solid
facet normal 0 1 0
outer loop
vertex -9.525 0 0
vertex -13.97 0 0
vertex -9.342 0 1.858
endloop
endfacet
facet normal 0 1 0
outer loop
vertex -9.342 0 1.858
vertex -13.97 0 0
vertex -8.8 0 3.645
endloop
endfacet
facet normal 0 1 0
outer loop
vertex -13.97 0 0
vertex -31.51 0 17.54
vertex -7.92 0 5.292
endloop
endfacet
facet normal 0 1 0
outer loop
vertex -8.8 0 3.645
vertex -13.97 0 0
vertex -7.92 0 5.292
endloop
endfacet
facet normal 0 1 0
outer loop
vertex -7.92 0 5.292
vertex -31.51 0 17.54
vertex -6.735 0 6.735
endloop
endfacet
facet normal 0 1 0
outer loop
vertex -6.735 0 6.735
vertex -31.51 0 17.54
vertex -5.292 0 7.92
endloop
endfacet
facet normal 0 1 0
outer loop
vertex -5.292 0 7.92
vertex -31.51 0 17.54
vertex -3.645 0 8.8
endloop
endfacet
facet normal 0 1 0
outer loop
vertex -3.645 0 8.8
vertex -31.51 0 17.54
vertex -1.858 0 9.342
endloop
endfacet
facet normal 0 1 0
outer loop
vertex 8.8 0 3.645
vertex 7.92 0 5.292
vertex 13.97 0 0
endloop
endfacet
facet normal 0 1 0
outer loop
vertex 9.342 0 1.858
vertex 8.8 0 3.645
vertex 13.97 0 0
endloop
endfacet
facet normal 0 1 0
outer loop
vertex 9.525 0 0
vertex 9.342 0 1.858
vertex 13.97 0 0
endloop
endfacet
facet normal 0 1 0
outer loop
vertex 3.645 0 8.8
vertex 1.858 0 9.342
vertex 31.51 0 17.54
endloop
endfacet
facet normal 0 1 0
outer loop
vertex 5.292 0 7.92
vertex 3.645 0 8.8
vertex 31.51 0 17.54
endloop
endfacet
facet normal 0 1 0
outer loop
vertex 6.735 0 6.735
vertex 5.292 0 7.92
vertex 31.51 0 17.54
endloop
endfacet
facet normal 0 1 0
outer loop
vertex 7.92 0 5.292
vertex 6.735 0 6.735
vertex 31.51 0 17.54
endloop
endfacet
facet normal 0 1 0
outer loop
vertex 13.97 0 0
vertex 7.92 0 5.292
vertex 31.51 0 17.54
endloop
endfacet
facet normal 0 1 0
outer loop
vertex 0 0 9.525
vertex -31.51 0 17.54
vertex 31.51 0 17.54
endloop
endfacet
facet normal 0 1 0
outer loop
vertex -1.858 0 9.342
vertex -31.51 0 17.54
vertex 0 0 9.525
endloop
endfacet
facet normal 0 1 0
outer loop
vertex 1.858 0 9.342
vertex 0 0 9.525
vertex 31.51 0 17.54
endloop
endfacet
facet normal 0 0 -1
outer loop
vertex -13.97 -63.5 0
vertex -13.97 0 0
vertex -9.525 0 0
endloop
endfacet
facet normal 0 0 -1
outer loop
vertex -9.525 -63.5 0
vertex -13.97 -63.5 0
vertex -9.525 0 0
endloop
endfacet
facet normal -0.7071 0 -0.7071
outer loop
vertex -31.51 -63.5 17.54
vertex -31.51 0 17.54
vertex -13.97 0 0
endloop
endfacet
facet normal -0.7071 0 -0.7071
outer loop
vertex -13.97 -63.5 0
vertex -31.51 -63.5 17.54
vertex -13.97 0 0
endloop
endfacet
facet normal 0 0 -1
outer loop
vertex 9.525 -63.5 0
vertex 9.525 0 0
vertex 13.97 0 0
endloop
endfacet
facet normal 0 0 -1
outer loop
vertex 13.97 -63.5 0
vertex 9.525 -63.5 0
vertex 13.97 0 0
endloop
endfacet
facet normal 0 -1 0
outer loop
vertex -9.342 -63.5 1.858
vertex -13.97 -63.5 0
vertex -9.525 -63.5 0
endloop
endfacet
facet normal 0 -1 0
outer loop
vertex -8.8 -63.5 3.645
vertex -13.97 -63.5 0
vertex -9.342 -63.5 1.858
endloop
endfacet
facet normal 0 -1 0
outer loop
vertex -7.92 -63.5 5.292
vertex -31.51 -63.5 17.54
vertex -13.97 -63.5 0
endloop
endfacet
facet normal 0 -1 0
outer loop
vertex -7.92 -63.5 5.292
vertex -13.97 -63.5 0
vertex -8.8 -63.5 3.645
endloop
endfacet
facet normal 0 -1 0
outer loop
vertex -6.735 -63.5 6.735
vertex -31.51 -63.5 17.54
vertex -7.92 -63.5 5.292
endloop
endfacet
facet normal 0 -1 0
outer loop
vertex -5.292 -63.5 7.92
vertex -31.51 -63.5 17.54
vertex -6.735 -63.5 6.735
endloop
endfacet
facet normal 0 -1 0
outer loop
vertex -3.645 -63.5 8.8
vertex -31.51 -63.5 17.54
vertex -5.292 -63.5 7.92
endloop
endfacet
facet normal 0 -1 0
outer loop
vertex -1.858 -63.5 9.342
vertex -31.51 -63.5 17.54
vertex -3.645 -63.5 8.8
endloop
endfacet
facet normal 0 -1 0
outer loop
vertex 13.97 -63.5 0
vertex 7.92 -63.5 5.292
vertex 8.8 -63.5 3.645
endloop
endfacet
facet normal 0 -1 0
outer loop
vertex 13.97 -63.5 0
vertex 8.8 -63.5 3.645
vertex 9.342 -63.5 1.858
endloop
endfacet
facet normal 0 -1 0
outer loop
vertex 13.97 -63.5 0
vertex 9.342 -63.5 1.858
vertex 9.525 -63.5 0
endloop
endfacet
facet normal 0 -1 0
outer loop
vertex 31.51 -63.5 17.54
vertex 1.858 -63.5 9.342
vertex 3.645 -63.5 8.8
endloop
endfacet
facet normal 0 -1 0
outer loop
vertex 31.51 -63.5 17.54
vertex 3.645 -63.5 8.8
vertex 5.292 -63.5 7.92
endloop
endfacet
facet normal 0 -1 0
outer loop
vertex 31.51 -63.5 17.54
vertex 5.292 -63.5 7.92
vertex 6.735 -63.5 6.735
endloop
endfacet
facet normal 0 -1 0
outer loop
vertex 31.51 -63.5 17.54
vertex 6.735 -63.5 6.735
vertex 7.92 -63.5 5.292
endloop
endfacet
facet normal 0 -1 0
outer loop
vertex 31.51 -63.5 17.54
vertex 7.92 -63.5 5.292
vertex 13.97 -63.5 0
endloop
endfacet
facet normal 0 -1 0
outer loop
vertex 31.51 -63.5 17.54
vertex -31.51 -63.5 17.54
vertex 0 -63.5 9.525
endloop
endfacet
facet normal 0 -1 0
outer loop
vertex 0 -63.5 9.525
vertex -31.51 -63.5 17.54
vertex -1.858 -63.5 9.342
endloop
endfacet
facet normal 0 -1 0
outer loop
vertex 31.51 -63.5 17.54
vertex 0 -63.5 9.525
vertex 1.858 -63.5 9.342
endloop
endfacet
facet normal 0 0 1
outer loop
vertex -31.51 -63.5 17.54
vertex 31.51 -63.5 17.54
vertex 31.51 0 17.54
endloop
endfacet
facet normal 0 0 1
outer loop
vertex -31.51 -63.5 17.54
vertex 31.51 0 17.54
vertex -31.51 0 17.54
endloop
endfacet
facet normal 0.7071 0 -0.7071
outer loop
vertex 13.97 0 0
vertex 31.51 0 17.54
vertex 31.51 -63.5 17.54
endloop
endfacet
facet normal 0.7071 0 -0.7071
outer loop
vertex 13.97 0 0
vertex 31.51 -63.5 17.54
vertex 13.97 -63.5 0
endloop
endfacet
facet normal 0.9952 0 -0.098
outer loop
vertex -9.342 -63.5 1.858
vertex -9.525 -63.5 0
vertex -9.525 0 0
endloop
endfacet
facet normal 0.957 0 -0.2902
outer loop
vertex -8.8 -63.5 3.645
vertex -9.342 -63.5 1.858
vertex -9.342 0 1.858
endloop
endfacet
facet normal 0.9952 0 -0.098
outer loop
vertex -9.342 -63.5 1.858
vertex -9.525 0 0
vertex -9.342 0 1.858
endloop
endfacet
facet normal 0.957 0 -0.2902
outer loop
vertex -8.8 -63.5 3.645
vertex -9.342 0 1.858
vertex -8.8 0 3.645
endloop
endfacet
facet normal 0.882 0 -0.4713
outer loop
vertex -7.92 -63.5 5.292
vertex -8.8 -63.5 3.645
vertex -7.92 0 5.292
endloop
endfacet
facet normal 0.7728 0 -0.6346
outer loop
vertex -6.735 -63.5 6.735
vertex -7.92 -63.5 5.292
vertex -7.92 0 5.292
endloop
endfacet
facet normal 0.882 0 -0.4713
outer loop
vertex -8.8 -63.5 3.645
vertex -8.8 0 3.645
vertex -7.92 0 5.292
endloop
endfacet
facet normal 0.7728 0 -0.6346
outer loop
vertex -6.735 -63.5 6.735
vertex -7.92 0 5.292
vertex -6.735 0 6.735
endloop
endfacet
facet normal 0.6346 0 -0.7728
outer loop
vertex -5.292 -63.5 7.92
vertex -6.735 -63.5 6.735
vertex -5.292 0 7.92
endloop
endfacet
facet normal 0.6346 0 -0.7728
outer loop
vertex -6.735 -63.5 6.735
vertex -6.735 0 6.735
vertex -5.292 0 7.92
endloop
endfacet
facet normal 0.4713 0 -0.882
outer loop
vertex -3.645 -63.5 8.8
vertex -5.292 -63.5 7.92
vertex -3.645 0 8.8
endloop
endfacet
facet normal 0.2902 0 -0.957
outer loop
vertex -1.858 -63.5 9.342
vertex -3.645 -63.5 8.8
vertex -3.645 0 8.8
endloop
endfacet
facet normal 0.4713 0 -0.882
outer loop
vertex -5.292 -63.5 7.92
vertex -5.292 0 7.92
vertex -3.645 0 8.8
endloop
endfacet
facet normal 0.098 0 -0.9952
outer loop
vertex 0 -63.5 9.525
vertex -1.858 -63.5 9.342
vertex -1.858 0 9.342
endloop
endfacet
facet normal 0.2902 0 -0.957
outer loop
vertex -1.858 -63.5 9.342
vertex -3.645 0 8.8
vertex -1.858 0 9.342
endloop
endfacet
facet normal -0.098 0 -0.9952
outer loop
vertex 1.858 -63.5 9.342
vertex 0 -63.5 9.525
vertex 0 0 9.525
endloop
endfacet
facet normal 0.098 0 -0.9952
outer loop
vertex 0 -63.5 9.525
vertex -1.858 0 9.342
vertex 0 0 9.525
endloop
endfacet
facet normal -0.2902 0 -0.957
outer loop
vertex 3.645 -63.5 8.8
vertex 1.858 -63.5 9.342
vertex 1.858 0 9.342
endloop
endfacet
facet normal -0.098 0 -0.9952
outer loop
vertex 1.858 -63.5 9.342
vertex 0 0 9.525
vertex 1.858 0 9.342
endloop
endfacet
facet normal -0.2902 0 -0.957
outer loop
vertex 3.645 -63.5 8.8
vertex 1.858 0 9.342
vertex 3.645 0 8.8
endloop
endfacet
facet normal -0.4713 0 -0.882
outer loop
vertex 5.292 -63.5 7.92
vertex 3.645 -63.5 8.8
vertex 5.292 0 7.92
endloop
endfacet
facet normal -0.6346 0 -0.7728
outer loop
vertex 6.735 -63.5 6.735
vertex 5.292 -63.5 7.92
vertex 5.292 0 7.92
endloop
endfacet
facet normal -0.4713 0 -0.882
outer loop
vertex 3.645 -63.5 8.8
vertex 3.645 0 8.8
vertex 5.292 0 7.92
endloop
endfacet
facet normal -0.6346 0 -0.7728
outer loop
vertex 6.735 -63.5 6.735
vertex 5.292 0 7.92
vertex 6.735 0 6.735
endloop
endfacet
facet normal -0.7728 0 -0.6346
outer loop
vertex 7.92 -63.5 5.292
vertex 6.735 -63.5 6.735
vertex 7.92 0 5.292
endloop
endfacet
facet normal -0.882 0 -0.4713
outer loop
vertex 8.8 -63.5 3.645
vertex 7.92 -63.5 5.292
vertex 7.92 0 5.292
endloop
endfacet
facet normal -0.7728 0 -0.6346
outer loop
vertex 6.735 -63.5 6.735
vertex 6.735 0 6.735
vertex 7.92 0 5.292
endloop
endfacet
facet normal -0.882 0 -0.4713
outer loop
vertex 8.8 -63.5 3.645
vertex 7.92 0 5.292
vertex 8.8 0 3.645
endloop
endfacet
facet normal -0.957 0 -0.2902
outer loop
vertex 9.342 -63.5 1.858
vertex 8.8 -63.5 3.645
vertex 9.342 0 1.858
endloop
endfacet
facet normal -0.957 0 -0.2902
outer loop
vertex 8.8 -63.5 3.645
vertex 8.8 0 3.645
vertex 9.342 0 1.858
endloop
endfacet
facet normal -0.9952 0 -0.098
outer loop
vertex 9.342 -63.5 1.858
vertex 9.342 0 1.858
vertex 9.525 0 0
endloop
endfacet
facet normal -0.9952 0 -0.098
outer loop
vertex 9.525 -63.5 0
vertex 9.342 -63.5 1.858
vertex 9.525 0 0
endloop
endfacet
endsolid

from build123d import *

# Parameters (mm, degrees)
F2_DEPTH    = 63.5
F3_T1_DEPTH = 154.9490470521


# Not quite as in the source:
# - a fillet or chamfer that OpenCascade refuses, or shapes differently, is made with other operations: its cross-section is extruded or revolved along the edge and cut away or added


with BuildPart() as f2:
    # F1 (on face) → F2 (new body)
    with BuildSketch(Plane.XZ):
        with BuildLine():
            ThreePointArc((-9.525, 0), (0, 9.525), (9.525, 0))
            Line((9.525, 0), (17.9719245062, 0))
            Line((17.9719245062, 0), (31.75, 0))
            Line((31.75, 0), (31.75, 17.5402989774))
            Line((31.75, 17.5402989774), (-31.75, 17.5402989774))
            Line((-31.75, 17.5402989774), (-31.75, 0))
            Line((-31.75, 0), (-17.9475410922, 0))
            Line((-17.9475410922, 0), (-9.525, 0))
        make_face()
    extrude(amount=F2_DEPTH)

    # F3: chamfer of 17.78 on 2 edges, made by hand

    # F3_s2 → F3_t1 (cut)
    with BuildSketch(Plane.XZ.offset(-45.724523526)):
        Polygon((-31.75, 17.78), (-13.97, 0), (-31.75, 0), align=None)
        Polygon((31.75, 17.78), (13.97, 0), (31.75, 0), align=None)
    extrude(amount=F3_T1_DEPTH, mode=Mode.SUBTRACT)


solid = f2.part
